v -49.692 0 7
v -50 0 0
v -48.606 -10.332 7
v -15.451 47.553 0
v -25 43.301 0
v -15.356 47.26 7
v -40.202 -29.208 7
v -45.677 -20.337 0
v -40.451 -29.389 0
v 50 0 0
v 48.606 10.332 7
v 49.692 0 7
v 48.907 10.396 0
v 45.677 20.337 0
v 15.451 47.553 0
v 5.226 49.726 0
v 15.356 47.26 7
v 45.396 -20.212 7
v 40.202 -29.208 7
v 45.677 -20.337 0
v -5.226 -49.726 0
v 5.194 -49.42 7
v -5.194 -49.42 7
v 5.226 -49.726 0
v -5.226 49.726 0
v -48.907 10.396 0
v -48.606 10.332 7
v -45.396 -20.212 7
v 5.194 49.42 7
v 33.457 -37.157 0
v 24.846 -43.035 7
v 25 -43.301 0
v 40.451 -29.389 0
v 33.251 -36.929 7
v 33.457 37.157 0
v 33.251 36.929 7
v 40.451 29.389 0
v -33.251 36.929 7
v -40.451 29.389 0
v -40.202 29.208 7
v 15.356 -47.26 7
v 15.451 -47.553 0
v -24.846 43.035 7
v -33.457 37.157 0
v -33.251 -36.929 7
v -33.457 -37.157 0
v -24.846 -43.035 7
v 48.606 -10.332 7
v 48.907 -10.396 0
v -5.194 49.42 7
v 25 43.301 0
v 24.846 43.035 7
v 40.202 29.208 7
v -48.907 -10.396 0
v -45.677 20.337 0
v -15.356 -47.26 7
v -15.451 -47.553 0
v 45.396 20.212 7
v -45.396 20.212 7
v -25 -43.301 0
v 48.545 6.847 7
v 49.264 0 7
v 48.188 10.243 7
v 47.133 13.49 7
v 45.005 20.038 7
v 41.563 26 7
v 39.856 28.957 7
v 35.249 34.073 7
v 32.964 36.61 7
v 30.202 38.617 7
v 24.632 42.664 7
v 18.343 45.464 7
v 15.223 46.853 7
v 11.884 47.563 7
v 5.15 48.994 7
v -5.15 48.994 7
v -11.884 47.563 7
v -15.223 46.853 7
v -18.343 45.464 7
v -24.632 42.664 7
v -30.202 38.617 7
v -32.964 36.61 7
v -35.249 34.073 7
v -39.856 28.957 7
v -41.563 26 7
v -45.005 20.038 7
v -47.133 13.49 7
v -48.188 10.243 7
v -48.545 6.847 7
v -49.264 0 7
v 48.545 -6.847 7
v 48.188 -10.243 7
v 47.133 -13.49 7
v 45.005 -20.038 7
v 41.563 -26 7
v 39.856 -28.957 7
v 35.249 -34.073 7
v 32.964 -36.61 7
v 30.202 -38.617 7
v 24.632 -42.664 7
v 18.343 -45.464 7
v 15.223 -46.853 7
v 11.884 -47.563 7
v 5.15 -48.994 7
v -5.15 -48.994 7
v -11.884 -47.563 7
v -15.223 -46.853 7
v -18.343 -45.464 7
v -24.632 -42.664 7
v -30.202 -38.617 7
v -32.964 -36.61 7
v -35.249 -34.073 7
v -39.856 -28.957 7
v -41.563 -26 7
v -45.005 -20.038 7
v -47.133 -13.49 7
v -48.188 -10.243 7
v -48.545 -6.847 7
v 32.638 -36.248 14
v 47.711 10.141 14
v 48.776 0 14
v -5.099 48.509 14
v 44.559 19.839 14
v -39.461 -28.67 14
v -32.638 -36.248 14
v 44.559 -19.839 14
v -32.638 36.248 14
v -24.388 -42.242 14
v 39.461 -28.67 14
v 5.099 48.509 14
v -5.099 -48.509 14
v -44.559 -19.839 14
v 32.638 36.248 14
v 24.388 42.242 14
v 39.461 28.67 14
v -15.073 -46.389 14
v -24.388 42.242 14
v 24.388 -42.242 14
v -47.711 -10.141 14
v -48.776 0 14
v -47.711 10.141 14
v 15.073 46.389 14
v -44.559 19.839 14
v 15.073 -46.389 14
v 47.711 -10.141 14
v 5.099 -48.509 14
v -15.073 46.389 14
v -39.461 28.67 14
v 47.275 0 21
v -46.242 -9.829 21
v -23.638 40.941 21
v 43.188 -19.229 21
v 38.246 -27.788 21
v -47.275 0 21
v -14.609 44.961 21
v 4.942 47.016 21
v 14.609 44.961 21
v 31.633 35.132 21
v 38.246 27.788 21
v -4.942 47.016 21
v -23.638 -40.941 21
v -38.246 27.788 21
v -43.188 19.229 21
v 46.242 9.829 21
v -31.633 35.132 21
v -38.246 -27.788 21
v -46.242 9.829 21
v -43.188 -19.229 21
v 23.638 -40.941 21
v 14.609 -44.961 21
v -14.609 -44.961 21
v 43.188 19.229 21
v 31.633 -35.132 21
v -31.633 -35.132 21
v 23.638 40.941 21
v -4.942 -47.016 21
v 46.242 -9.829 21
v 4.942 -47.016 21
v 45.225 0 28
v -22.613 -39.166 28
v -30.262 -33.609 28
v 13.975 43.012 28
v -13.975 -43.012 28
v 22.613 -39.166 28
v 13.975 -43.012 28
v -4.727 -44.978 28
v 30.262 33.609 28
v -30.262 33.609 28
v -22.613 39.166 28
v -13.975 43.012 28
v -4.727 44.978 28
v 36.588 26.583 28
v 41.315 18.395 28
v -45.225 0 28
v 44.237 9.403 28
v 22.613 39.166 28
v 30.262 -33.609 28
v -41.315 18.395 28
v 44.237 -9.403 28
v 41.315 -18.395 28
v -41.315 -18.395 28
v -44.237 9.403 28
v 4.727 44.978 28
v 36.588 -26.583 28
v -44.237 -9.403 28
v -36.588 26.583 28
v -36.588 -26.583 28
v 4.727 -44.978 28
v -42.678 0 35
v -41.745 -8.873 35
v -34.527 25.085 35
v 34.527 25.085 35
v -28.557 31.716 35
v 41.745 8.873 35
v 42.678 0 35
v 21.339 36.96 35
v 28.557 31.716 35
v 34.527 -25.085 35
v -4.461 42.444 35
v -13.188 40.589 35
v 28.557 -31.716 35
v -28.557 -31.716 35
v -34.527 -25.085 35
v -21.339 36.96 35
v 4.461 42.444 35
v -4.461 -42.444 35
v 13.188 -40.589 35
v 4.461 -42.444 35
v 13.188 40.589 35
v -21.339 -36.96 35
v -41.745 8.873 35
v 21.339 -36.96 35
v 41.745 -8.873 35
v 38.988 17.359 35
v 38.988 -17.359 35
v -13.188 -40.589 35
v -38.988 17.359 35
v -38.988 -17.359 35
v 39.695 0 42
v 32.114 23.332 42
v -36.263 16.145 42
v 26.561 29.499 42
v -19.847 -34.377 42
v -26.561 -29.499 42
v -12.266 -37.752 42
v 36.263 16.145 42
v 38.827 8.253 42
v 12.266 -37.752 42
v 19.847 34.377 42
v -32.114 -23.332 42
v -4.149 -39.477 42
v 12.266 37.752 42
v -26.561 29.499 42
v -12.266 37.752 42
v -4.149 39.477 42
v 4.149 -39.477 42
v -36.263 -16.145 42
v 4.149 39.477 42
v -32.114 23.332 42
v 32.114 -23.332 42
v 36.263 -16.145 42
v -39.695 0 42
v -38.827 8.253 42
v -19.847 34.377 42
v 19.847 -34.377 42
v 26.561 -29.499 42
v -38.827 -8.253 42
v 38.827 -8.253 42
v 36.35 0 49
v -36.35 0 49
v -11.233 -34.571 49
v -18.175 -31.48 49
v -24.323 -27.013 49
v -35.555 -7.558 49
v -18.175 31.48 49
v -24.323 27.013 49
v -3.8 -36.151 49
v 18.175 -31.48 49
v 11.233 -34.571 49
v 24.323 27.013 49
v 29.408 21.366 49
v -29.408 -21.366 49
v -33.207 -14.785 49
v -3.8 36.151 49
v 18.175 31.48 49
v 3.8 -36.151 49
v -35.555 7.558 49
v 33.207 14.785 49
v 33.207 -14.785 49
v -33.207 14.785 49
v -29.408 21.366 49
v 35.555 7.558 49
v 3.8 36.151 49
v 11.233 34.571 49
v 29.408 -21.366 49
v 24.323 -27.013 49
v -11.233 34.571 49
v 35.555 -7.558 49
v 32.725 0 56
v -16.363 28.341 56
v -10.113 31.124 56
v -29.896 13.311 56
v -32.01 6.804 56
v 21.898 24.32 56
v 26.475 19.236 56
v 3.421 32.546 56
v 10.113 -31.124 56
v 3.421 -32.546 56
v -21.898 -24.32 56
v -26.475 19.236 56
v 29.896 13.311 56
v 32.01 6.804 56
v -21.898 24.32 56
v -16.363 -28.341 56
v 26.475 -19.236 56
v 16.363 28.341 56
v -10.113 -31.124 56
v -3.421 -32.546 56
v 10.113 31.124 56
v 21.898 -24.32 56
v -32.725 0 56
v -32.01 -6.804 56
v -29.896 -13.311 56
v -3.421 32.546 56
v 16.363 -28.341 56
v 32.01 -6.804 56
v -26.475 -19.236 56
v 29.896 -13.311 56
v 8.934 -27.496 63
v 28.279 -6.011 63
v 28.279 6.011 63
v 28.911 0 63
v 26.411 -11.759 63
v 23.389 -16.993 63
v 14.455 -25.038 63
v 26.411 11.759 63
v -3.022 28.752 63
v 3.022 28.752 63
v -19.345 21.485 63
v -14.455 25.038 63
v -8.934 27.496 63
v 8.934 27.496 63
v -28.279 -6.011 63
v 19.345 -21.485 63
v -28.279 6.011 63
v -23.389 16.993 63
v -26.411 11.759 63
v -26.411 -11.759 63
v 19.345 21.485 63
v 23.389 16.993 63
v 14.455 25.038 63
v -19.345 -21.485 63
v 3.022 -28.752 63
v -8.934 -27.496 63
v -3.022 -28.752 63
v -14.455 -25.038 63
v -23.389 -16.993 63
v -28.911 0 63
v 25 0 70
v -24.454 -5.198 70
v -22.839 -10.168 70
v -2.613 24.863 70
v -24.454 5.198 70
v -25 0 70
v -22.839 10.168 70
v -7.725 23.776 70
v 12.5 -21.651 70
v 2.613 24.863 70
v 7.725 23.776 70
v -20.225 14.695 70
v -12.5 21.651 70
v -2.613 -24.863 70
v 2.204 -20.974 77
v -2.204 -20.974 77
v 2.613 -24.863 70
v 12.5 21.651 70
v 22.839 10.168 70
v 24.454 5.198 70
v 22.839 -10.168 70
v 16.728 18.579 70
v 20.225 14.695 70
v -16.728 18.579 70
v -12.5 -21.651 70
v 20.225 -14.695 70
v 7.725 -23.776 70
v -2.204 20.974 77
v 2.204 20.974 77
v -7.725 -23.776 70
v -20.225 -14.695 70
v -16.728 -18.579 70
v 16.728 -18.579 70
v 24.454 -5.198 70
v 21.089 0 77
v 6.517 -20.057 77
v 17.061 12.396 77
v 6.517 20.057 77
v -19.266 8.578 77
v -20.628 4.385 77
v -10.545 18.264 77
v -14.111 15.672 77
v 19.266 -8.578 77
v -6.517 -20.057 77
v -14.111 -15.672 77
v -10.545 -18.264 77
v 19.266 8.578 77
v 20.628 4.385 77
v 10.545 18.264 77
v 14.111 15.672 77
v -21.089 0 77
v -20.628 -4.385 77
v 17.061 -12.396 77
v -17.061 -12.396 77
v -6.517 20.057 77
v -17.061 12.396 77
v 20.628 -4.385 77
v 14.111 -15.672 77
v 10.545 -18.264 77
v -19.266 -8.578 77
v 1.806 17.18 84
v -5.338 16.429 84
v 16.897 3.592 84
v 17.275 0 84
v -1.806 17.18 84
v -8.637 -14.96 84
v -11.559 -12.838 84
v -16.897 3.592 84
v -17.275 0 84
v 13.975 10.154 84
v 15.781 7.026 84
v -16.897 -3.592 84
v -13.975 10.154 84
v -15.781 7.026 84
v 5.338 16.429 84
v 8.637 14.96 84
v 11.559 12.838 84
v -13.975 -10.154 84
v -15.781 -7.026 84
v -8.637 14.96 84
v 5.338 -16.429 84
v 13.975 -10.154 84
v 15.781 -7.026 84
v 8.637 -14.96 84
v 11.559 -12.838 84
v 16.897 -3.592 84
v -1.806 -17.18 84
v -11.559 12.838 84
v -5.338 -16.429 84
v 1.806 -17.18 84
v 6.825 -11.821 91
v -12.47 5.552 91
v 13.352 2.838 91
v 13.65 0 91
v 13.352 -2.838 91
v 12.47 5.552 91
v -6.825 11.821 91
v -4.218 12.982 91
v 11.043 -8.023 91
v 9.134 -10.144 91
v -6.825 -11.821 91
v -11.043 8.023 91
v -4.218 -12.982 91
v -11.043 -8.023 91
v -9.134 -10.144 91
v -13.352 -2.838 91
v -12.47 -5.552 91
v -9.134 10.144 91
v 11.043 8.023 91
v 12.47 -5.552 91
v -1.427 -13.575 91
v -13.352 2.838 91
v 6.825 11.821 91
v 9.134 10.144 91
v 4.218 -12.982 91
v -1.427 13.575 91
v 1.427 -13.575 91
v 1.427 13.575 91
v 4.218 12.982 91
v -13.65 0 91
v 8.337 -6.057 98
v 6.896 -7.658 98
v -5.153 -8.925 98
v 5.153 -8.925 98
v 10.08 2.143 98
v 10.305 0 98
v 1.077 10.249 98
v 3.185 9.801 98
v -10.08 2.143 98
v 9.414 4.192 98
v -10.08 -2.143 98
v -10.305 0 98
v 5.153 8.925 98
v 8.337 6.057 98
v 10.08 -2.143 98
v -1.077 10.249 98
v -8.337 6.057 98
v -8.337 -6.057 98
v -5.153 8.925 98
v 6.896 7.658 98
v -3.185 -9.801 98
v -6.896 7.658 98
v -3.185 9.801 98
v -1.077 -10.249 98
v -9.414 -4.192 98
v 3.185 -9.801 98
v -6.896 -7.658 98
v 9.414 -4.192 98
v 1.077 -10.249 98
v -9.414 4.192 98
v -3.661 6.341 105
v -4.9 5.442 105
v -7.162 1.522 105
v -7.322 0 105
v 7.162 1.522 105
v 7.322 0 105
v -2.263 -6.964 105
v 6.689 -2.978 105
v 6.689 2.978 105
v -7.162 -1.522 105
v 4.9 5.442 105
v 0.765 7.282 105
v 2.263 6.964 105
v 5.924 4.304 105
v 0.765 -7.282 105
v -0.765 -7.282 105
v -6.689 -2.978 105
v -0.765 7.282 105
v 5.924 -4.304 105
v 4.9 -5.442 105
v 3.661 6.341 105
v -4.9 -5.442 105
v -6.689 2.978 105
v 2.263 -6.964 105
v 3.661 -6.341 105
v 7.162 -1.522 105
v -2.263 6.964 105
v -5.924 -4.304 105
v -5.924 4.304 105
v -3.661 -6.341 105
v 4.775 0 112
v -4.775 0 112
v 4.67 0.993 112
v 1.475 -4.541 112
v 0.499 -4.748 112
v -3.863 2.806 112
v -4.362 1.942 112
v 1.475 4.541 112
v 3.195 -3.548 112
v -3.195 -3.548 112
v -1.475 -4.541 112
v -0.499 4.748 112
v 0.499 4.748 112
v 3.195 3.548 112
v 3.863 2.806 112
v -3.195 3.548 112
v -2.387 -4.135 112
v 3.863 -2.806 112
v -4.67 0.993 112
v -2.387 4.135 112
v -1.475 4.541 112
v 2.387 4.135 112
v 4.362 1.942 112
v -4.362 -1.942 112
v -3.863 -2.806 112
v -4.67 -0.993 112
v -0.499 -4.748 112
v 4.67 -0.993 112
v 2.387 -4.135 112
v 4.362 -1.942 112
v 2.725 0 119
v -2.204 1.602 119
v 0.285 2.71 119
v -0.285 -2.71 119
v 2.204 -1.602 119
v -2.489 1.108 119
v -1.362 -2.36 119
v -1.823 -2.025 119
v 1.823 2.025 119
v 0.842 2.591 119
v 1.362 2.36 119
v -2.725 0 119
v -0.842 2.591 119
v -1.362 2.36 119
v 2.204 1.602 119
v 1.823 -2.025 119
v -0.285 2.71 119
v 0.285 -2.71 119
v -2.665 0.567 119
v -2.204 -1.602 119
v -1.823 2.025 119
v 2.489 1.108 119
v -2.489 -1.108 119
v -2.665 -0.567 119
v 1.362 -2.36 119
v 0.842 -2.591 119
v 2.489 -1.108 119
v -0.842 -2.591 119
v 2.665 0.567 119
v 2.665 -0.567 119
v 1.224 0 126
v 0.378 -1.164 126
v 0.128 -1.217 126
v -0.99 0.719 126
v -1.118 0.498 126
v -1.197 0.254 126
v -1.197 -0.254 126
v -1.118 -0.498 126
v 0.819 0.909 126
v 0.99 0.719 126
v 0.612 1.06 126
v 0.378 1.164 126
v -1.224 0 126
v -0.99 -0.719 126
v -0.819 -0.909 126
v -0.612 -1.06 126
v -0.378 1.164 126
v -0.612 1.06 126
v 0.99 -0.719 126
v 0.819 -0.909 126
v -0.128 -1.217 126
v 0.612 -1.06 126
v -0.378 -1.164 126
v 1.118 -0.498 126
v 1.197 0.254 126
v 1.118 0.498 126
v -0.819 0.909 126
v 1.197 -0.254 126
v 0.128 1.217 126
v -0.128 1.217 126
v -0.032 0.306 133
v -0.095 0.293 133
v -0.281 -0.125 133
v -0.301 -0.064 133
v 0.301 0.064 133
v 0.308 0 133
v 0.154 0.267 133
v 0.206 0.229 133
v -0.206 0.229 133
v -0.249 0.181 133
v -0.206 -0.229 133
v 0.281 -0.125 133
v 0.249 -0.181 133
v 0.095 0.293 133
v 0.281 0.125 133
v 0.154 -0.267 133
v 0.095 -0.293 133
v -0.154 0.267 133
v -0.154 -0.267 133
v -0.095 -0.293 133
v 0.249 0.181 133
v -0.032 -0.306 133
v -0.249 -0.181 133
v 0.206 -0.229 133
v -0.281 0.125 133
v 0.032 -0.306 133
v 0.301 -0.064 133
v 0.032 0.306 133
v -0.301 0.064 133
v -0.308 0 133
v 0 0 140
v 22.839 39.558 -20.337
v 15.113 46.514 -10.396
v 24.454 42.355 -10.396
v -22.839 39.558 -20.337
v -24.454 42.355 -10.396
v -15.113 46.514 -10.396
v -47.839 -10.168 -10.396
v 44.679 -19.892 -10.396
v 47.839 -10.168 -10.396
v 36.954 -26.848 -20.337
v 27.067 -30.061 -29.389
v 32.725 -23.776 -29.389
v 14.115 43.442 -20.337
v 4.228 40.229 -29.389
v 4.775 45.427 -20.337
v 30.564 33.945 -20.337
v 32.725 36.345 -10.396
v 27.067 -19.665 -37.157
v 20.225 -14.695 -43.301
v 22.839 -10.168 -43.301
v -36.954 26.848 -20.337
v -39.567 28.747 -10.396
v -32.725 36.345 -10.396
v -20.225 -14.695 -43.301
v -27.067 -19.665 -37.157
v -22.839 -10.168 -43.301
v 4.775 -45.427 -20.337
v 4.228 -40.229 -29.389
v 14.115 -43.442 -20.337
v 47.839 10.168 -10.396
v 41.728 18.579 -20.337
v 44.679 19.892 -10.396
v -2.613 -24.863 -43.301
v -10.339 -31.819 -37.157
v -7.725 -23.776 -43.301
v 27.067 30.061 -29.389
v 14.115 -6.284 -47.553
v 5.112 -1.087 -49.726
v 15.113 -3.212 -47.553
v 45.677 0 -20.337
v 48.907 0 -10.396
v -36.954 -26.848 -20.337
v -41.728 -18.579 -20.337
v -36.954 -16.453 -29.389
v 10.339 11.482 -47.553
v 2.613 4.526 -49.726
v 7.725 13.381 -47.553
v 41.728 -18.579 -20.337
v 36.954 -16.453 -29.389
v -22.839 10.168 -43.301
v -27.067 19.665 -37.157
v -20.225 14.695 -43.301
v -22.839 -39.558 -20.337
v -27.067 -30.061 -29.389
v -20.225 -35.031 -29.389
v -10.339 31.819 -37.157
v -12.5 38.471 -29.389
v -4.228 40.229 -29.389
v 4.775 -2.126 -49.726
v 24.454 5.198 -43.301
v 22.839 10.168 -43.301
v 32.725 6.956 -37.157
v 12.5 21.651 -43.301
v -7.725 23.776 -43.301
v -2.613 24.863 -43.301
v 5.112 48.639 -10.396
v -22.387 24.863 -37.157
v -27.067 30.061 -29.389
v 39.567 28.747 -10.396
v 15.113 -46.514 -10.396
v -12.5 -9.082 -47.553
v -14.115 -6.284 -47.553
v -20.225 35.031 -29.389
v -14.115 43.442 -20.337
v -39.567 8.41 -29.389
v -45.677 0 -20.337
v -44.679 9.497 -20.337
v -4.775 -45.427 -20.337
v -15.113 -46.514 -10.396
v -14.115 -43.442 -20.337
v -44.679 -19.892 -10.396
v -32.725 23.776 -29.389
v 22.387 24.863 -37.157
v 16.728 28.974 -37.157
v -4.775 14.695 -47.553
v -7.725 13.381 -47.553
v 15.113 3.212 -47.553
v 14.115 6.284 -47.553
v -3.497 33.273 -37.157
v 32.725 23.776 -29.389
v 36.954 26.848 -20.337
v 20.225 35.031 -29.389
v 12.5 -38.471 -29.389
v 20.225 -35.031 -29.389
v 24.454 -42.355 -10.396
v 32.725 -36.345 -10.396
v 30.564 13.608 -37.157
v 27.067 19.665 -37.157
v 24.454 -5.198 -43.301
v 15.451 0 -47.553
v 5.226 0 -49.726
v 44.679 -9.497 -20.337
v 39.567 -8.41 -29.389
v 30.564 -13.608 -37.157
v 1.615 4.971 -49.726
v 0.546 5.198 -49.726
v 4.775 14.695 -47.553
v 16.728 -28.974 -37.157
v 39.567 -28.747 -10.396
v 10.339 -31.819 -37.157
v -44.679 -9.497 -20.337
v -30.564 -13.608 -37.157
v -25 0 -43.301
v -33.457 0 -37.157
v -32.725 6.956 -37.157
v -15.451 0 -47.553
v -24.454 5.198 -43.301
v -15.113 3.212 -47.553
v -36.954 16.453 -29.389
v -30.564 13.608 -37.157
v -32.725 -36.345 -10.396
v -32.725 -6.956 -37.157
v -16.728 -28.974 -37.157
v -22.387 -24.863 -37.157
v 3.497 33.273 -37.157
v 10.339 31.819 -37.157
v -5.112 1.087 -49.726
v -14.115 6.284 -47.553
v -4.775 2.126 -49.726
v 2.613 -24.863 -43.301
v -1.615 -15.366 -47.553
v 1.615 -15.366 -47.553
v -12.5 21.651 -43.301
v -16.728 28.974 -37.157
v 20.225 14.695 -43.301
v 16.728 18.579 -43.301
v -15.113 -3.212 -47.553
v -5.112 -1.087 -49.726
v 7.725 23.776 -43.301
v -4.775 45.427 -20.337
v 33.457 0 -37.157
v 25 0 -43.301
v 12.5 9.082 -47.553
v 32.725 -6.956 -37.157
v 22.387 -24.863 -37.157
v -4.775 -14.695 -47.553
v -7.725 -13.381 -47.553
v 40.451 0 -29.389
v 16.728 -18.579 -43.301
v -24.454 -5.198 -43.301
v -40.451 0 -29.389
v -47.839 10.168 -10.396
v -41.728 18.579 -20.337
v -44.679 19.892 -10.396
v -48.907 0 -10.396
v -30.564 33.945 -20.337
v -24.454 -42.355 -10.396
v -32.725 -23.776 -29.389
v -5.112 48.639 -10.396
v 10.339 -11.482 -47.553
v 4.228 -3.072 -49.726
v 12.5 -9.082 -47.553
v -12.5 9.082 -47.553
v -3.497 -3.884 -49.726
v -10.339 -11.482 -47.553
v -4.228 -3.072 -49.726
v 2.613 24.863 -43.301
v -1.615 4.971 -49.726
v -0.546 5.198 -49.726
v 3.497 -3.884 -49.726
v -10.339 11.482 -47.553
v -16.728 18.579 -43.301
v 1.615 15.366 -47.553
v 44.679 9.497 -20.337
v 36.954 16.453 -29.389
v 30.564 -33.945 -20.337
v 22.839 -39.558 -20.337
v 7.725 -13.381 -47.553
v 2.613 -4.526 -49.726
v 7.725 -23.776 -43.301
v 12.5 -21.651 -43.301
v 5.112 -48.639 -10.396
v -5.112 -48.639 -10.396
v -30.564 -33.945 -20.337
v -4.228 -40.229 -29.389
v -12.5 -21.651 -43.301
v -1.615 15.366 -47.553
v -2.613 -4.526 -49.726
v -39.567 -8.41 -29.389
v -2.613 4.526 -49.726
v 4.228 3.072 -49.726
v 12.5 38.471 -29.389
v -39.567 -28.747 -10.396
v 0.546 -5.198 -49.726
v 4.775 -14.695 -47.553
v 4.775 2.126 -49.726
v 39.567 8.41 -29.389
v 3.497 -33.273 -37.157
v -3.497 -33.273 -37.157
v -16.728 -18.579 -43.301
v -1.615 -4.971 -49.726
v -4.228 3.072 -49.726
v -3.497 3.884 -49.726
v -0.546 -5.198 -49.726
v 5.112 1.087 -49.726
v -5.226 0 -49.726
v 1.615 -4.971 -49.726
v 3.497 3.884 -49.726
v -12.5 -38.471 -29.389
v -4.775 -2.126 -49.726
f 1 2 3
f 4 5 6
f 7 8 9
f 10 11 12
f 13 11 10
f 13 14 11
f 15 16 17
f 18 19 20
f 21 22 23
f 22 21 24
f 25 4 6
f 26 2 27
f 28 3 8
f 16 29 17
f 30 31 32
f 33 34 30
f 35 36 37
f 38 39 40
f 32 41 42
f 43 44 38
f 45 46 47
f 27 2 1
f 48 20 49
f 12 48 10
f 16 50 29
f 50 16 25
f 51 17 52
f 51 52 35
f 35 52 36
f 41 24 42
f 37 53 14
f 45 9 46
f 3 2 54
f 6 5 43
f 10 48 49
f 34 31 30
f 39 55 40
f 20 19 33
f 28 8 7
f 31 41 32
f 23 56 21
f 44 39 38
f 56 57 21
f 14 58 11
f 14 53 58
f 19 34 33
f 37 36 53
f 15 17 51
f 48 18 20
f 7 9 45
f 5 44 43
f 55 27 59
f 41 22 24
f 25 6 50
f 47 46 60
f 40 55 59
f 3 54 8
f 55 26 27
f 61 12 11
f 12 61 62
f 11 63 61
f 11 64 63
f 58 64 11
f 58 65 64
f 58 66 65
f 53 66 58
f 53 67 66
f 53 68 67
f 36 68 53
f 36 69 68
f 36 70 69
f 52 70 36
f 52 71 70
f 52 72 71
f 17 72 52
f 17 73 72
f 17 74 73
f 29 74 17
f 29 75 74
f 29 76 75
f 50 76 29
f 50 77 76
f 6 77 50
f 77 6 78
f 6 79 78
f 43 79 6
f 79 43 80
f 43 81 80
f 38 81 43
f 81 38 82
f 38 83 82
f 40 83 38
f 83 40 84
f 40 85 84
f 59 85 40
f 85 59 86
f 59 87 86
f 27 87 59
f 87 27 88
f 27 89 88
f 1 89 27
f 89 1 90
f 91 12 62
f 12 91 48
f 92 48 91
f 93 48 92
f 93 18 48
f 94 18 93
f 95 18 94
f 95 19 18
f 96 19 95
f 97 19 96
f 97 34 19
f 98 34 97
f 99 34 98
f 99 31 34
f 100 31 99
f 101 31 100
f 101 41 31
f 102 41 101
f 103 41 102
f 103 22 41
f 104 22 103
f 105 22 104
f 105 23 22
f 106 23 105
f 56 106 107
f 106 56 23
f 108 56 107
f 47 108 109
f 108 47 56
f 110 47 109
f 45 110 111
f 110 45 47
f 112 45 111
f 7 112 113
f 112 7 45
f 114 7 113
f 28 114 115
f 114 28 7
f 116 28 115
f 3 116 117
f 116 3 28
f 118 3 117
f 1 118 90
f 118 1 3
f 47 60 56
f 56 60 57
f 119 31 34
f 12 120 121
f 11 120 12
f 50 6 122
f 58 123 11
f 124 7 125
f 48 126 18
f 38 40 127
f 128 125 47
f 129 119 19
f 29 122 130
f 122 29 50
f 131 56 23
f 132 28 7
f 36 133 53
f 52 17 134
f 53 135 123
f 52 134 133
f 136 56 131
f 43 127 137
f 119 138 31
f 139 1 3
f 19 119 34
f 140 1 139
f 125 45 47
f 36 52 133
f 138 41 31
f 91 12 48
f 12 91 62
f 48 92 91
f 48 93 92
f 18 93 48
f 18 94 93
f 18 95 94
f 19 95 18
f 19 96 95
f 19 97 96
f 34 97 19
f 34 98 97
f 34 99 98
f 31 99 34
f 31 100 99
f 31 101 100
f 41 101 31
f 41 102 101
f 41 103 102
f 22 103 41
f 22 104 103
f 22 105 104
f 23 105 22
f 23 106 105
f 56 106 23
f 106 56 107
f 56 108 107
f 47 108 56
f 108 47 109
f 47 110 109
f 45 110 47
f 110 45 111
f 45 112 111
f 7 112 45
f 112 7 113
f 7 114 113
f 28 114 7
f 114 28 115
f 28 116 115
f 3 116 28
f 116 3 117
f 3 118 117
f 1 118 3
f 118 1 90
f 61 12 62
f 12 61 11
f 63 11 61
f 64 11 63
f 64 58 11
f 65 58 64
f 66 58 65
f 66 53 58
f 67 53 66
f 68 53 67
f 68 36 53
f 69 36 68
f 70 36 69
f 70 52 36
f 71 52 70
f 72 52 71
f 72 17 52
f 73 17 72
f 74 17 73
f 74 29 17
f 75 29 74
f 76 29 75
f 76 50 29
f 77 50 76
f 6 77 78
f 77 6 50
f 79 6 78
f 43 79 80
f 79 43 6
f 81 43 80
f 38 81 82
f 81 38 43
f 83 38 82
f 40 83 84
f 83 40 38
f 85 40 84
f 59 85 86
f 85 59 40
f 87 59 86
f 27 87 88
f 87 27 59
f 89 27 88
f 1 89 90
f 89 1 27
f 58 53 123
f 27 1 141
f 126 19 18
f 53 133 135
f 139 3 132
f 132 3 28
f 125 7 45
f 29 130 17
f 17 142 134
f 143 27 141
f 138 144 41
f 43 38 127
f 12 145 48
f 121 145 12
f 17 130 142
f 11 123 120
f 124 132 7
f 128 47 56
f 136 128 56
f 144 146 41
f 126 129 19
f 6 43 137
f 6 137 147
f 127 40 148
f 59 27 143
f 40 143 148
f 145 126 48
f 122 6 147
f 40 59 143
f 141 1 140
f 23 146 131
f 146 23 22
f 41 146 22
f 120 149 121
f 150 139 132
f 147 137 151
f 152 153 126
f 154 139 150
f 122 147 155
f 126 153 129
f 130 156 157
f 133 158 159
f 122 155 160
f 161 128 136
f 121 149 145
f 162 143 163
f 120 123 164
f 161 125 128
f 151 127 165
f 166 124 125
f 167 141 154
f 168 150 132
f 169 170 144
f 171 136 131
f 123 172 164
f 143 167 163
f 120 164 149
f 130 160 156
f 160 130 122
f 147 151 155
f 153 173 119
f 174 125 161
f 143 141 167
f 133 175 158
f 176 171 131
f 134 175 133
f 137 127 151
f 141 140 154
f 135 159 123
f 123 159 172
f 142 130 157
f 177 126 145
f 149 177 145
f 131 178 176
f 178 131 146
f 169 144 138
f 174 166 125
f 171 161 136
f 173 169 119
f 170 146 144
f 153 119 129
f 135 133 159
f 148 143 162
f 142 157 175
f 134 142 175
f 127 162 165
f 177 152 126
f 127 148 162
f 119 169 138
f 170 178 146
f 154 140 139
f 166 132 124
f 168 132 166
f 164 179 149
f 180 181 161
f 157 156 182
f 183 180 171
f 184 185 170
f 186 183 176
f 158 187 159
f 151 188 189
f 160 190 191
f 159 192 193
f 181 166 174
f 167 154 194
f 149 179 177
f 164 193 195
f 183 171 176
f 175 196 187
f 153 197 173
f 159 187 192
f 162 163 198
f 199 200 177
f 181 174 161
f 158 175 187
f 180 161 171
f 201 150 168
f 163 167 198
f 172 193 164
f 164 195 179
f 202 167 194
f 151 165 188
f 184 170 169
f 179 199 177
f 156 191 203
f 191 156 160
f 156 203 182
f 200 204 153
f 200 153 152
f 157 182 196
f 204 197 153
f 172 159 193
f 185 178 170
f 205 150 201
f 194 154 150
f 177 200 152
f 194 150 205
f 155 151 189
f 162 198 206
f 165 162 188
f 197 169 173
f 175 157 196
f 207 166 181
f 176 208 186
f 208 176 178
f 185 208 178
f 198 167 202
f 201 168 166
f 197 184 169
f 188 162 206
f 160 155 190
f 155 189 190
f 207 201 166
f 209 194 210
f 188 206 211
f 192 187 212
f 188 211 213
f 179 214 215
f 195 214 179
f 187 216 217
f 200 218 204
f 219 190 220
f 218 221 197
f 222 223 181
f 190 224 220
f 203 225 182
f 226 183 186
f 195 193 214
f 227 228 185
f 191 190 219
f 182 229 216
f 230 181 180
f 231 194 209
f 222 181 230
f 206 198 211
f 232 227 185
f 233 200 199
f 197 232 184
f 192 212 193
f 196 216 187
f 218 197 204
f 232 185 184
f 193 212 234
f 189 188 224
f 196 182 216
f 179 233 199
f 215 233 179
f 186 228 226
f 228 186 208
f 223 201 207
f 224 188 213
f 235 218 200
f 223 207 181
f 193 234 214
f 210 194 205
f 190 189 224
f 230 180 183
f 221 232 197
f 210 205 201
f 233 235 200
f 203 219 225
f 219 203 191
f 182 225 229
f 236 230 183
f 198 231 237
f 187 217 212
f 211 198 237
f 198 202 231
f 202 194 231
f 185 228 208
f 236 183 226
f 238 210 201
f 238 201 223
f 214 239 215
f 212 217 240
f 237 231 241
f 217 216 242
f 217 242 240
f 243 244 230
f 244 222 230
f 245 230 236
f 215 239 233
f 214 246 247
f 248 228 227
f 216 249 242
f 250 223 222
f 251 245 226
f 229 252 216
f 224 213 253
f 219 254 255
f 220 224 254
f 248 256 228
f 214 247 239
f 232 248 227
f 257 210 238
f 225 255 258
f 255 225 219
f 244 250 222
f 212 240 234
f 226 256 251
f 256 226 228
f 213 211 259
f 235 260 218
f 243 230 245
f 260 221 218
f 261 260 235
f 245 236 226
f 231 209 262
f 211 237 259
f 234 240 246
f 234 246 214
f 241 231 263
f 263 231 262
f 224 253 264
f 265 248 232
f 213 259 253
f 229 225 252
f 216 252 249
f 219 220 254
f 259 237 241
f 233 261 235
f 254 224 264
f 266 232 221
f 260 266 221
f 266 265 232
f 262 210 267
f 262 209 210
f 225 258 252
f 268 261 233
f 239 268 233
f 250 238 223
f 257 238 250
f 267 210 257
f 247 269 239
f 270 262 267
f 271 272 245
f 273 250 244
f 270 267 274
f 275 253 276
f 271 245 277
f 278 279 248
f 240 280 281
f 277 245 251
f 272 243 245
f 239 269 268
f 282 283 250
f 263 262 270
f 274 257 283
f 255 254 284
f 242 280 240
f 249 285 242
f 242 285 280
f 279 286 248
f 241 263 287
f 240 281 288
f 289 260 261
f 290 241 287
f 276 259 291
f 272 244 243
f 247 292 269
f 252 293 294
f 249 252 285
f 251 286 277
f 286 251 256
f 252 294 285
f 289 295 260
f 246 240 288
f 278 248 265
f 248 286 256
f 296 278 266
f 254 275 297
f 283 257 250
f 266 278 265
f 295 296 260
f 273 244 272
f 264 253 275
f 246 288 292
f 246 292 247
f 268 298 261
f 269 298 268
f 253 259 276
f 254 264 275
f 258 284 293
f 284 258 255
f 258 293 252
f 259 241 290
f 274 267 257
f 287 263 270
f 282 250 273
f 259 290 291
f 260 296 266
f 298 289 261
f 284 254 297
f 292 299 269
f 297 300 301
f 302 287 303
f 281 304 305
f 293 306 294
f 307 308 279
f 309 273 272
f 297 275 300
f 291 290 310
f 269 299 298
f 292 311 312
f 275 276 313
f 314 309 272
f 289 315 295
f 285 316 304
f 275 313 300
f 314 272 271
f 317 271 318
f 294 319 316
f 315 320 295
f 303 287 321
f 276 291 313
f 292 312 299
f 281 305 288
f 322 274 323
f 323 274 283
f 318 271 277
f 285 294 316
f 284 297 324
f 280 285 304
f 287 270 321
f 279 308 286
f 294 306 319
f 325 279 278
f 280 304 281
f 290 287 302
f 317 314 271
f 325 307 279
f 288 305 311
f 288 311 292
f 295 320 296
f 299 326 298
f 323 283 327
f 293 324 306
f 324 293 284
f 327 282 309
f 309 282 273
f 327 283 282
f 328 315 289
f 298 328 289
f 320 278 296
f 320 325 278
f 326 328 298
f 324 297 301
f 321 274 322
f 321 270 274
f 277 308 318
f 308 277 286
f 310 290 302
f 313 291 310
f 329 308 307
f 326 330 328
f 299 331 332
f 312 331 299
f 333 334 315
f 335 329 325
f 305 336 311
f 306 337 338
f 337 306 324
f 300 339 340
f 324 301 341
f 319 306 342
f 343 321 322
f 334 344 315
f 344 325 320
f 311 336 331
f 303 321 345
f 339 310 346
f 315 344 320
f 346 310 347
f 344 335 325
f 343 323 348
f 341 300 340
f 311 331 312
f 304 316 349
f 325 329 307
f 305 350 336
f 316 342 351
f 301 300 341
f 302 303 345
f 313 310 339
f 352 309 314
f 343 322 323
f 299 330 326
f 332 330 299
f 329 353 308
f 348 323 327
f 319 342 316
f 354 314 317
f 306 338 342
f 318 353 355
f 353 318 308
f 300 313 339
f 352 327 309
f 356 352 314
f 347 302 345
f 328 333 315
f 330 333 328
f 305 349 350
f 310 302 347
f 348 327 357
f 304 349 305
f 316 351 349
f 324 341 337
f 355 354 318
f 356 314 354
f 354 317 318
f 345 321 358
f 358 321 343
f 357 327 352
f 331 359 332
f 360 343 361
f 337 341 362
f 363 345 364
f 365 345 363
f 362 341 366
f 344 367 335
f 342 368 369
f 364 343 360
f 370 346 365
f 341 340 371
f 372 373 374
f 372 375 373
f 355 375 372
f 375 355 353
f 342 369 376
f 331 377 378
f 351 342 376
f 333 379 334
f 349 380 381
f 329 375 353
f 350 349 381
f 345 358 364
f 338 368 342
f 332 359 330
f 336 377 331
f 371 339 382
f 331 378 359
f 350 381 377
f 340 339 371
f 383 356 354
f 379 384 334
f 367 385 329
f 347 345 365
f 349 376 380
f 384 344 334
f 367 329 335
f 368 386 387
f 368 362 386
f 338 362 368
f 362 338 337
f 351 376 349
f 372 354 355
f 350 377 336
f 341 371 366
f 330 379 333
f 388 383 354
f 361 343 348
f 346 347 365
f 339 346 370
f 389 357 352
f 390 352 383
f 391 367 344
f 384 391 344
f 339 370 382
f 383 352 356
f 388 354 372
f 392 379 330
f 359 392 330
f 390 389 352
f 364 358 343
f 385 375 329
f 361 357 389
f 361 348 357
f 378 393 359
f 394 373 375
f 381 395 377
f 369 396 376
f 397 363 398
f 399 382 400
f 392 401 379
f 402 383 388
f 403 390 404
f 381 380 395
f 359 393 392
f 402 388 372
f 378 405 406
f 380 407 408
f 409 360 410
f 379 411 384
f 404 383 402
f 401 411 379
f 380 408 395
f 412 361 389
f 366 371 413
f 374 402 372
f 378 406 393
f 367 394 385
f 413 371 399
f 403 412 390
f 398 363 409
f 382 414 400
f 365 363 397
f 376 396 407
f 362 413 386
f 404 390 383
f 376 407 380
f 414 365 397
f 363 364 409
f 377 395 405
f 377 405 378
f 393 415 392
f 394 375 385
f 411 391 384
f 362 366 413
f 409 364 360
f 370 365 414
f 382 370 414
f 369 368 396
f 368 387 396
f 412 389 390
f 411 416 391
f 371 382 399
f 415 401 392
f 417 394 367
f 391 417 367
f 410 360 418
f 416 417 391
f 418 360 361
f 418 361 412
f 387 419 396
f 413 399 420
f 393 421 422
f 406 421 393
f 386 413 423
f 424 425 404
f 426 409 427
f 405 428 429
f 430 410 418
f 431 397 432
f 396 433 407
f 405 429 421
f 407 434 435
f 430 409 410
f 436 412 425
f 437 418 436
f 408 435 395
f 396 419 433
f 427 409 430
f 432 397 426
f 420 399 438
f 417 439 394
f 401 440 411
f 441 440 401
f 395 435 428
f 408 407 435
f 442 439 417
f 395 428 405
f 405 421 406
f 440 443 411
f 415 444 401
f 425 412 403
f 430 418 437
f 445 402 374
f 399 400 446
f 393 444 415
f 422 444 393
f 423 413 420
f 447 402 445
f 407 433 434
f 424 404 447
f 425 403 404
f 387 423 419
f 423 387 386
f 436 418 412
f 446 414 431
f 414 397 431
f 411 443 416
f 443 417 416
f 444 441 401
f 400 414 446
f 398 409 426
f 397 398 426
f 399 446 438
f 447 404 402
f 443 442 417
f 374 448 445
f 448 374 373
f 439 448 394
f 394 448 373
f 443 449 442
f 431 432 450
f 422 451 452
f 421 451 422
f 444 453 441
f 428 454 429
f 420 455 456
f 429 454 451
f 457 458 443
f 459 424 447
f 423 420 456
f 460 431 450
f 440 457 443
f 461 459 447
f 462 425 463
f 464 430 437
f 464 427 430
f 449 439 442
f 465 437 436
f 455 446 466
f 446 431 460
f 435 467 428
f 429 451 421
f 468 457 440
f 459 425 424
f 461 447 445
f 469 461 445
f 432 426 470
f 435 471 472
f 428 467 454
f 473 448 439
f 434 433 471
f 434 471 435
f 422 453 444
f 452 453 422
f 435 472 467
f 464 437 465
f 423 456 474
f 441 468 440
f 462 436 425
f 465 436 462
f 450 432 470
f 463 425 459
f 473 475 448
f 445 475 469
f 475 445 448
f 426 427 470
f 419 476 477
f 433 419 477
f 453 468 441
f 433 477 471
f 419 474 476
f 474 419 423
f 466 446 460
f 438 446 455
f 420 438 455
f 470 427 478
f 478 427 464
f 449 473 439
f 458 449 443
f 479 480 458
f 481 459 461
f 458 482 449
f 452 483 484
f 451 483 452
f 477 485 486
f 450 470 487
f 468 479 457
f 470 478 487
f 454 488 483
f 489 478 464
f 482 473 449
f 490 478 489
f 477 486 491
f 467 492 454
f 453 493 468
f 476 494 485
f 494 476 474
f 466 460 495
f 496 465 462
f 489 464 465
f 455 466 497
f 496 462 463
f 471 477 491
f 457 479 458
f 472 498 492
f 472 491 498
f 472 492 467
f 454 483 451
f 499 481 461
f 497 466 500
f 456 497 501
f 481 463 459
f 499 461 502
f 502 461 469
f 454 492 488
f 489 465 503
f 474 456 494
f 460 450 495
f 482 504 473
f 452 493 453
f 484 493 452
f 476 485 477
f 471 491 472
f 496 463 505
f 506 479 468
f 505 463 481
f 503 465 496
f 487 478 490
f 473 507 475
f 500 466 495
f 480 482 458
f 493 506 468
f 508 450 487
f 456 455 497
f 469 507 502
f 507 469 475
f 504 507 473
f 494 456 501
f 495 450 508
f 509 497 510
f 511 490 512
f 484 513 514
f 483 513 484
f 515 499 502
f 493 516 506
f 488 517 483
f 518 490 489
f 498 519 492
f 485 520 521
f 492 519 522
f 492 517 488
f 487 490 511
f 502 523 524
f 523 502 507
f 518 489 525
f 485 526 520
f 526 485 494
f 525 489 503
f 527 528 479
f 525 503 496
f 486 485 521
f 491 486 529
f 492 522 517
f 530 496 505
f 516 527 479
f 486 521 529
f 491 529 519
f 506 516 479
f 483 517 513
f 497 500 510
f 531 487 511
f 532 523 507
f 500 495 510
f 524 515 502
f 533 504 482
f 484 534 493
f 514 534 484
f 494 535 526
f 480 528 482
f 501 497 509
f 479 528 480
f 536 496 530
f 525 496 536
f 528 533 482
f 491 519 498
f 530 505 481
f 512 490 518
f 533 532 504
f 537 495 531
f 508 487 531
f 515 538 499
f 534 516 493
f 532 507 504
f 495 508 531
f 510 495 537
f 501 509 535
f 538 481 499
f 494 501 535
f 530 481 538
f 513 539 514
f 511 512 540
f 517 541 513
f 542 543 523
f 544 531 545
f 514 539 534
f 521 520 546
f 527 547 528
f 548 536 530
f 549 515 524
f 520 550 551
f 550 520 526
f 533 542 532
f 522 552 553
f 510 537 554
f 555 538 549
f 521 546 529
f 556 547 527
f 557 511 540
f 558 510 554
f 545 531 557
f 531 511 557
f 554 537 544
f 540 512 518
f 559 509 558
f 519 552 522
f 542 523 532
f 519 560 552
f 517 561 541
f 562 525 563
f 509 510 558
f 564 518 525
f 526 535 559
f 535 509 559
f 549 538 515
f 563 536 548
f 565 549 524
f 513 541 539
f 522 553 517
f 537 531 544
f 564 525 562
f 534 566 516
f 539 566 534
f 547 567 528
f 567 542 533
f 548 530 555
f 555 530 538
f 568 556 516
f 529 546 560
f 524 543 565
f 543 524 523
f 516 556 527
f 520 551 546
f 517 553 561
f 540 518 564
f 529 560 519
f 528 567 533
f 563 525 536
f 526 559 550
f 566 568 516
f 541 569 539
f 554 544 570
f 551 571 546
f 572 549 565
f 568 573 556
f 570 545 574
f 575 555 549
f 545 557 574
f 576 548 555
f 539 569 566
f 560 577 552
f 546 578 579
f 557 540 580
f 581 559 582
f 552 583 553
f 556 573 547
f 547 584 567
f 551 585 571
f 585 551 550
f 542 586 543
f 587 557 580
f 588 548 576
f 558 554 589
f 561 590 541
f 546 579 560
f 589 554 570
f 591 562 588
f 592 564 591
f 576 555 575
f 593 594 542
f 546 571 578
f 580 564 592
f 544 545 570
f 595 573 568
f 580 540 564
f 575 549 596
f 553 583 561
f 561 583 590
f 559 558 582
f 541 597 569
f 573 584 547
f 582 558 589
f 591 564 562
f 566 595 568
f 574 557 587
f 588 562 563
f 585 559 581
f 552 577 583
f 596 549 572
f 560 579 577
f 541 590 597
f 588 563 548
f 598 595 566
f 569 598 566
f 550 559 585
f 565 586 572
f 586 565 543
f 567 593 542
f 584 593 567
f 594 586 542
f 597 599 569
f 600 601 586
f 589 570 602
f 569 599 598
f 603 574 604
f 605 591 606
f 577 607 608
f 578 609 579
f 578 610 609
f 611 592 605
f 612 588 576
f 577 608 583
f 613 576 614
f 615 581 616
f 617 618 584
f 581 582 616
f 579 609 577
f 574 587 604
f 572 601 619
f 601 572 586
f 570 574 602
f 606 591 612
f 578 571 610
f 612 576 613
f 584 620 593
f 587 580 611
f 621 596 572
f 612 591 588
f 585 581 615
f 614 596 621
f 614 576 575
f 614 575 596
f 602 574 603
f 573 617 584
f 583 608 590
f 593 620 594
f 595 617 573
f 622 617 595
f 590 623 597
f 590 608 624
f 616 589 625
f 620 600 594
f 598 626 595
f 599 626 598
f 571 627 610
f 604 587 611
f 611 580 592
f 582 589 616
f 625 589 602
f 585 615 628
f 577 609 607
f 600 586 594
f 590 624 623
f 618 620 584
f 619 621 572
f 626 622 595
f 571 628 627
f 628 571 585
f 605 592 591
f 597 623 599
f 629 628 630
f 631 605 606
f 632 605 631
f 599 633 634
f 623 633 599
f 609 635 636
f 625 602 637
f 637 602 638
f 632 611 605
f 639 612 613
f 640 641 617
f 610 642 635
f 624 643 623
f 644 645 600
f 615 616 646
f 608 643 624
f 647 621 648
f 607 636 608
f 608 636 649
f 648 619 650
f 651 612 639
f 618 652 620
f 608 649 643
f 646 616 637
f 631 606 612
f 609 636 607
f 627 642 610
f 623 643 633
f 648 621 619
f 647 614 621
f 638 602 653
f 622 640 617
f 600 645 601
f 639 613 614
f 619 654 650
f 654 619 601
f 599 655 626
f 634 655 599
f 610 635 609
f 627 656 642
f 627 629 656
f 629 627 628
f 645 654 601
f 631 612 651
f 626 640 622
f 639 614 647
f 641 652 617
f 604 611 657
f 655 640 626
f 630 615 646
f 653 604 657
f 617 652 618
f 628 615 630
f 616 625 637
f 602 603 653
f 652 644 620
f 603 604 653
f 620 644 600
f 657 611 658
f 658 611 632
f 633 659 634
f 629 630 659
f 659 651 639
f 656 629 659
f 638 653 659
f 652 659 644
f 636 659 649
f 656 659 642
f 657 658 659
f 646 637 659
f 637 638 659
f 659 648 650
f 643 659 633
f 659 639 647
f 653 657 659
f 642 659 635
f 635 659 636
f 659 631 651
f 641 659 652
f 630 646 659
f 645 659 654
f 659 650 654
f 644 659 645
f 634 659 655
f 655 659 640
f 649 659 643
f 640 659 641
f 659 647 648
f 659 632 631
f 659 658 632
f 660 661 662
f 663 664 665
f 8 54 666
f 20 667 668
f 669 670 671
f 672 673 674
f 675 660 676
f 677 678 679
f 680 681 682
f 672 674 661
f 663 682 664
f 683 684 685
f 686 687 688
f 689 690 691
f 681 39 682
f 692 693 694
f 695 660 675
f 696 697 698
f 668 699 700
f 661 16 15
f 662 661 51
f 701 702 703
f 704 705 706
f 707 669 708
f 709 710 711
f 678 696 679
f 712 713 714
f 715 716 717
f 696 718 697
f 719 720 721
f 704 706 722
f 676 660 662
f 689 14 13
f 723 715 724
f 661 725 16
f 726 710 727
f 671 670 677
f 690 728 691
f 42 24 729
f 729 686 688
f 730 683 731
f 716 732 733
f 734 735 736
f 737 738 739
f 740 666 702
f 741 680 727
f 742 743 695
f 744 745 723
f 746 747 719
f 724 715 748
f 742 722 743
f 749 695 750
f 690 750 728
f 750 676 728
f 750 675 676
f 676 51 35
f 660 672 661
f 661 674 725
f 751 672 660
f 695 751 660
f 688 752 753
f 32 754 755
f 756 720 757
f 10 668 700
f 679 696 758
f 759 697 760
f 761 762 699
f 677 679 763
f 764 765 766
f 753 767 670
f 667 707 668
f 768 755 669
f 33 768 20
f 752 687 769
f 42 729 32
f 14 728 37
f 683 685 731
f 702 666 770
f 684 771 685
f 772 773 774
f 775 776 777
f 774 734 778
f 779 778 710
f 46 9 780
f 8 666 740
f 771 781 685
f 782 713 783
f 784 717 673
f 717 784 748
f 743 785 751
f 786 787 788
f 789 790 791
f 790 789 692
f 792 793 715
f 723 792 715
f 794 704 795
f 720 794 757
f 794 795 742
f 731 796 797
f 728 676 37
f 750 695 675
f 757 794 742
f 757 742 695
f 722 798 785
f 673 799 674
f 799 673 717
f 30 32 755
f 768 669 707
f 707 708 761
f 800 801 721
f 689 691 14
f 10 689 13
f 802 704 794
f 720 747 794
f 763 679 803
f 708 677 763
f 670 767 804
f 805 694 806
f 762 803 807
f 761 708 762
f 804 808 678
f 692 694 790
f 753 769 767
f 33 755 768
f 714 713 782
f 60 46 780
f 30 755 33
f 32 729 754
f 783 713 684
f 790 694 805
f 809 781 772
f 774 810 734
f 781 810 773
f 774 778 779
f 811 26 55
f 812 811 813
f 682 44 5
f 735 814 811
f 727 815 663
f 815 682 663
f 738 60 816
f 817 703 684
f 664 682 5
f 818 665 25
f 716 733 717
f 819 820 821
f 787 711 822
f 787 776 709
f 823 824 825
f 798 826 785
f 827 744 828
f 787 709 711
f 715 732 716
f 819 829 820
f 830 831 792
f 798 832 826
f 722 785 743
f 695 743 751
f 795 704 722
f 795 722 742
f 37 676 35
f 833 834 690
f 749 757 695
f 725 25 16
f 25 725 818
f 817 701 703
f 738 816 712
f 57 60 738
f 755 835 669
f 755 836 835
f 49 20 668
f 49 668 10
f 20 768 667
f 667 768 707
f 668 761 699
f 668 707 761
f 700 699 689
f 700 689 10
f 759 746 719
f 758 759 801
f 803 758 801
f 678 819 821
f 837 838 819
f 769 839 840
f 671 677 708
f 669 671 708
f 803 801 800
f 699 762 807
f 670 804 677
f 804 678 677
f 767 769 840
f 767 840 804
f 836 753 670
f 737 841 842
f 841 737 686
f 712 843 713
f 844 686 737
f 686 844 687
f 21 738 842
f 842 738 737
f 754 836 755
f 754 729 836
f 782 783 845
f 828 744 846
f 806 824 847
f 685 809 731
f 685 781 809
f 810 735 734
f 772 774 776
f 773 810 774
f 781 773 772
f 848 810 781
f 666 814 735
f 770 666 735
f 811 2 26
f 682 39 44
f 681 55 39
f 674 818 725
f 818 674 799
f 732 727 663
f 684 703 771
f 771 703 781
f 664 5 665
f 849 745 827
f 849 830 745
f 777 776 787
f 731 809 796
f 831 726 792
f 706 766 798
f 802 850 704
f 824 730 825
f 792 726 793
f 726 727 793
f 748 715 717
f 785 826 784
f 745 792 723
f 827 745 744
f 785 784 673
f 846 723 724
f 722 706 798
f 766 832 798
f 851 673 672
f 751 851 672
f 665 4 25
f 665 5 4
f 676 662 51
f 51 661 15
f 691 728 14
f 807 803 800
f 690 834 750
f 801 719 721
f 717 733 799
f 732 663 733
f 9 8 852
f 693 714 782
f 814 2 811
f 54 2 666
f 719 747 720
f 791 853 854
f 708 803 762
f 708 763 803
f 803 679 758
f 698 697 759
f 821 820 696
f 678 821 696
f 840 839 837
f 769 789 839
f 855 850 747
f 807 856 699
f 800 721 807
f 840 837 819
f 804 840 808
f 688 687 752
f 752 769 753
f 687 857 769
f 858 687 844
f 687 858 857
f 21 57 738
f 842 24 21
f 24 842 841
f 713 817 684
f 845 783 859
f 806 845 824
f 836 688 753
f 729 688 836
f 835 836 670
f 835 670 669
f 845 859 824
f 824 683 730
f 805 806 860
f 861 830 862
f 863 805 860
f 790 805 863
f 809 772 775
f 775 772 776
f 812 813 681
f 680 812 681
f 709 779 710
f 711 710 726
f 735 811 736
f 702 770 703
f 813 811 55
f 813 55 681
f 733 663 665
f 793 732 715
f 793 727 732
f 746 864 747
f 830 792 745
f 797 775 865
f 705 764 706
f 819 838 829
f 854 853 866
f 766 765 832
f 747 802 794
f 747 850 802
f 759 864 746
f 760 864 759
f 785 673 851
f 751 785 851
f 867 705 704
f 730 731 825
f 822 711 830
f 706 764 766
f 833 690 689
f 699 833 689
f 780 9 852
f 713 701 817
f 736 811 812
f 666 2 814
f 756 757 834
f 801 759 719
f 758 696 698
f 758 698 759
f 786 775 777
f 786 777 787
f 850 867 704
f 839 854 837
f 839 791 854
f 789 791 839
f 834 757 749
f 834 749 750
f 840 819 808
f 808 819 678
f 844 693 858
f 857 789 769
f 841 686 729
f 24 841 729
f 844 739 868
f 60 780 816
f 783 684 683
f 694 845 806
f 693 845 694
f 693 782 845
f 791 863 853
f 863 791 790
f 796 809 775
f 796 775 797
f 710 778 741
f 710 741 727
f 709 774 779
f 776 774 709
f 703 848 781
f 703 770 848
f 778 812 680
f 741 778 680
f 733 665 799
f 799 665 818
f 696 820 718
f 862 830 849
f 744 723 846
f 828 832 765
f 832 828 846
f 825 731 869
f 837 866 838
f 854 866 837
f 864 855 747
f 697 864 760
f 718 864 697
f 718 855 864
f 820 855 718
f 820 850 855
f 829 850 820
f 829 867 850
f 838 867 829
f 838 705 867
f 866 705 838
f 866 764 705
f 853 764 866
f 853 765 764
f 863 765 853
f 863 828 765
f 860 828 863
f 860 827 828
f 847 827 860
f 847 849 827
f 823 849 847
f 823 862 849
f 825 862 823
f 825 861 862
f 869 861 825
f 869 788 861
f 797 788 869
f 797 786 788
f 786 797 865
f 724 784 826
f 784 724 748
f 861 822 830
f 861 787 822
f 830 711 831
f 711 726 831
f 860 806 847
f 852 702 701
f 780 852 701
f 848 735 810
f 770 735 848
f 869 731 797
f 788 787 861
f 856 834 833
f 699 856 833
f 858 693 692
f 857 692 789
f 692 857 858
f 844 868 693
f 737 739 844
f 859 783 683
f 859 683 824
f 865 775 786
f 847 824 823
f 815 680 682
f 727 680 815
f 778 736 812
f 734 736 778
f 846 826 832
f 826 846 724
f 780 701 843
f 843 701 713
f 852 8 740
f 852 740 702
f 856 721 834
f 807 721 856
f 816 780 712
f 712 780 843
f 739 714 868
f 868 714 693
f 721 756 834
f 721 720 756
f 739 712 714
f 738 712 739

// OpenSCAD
/*
Creates a 3 dimensional raindrop shape.

parameters:
	radius		radius of the sphere on the bottom of the raindrop shape
	centered	boolean value. sets the bottom sphere as centered (true) on [0, 0, 0],
	or sets the entire object in the positive [x, y, z] quadrant
*/

// Radius in millimeters.
radius = 50; // [1:100]

// Height is a multiple of the radius.
height = 2.8; // [2:20]

// Steps are the number of cylinders to make up the upper pointy end.
steps = 20; // [2:50]

// Controls how many facets go around the curve.
facets = 30; // [5:100]

// A silly bonus feature for revealing how the script works.
loops = 1; // [0:4]

raindrop3D( radius, height, steps, loops, facets );

module raindrop3D(radius, height, steps, loops, facets){

	sphere(radius, $fn = facets );

	for( i = [ 0 : steps * loops - 1 ] ){
		translate([0, 0, radius * height / steps * i])
			cylinder(h = 1 / steps * height * radius, // This is fine.
					r1 = (cos( 180 * i / steps )/2+0.5) * radius,
					r2 = (cos( 180 * (i+1) / steps )/2+0.5) * radius,
          $fn = facets );
	}

}//end of module raindrop3D
